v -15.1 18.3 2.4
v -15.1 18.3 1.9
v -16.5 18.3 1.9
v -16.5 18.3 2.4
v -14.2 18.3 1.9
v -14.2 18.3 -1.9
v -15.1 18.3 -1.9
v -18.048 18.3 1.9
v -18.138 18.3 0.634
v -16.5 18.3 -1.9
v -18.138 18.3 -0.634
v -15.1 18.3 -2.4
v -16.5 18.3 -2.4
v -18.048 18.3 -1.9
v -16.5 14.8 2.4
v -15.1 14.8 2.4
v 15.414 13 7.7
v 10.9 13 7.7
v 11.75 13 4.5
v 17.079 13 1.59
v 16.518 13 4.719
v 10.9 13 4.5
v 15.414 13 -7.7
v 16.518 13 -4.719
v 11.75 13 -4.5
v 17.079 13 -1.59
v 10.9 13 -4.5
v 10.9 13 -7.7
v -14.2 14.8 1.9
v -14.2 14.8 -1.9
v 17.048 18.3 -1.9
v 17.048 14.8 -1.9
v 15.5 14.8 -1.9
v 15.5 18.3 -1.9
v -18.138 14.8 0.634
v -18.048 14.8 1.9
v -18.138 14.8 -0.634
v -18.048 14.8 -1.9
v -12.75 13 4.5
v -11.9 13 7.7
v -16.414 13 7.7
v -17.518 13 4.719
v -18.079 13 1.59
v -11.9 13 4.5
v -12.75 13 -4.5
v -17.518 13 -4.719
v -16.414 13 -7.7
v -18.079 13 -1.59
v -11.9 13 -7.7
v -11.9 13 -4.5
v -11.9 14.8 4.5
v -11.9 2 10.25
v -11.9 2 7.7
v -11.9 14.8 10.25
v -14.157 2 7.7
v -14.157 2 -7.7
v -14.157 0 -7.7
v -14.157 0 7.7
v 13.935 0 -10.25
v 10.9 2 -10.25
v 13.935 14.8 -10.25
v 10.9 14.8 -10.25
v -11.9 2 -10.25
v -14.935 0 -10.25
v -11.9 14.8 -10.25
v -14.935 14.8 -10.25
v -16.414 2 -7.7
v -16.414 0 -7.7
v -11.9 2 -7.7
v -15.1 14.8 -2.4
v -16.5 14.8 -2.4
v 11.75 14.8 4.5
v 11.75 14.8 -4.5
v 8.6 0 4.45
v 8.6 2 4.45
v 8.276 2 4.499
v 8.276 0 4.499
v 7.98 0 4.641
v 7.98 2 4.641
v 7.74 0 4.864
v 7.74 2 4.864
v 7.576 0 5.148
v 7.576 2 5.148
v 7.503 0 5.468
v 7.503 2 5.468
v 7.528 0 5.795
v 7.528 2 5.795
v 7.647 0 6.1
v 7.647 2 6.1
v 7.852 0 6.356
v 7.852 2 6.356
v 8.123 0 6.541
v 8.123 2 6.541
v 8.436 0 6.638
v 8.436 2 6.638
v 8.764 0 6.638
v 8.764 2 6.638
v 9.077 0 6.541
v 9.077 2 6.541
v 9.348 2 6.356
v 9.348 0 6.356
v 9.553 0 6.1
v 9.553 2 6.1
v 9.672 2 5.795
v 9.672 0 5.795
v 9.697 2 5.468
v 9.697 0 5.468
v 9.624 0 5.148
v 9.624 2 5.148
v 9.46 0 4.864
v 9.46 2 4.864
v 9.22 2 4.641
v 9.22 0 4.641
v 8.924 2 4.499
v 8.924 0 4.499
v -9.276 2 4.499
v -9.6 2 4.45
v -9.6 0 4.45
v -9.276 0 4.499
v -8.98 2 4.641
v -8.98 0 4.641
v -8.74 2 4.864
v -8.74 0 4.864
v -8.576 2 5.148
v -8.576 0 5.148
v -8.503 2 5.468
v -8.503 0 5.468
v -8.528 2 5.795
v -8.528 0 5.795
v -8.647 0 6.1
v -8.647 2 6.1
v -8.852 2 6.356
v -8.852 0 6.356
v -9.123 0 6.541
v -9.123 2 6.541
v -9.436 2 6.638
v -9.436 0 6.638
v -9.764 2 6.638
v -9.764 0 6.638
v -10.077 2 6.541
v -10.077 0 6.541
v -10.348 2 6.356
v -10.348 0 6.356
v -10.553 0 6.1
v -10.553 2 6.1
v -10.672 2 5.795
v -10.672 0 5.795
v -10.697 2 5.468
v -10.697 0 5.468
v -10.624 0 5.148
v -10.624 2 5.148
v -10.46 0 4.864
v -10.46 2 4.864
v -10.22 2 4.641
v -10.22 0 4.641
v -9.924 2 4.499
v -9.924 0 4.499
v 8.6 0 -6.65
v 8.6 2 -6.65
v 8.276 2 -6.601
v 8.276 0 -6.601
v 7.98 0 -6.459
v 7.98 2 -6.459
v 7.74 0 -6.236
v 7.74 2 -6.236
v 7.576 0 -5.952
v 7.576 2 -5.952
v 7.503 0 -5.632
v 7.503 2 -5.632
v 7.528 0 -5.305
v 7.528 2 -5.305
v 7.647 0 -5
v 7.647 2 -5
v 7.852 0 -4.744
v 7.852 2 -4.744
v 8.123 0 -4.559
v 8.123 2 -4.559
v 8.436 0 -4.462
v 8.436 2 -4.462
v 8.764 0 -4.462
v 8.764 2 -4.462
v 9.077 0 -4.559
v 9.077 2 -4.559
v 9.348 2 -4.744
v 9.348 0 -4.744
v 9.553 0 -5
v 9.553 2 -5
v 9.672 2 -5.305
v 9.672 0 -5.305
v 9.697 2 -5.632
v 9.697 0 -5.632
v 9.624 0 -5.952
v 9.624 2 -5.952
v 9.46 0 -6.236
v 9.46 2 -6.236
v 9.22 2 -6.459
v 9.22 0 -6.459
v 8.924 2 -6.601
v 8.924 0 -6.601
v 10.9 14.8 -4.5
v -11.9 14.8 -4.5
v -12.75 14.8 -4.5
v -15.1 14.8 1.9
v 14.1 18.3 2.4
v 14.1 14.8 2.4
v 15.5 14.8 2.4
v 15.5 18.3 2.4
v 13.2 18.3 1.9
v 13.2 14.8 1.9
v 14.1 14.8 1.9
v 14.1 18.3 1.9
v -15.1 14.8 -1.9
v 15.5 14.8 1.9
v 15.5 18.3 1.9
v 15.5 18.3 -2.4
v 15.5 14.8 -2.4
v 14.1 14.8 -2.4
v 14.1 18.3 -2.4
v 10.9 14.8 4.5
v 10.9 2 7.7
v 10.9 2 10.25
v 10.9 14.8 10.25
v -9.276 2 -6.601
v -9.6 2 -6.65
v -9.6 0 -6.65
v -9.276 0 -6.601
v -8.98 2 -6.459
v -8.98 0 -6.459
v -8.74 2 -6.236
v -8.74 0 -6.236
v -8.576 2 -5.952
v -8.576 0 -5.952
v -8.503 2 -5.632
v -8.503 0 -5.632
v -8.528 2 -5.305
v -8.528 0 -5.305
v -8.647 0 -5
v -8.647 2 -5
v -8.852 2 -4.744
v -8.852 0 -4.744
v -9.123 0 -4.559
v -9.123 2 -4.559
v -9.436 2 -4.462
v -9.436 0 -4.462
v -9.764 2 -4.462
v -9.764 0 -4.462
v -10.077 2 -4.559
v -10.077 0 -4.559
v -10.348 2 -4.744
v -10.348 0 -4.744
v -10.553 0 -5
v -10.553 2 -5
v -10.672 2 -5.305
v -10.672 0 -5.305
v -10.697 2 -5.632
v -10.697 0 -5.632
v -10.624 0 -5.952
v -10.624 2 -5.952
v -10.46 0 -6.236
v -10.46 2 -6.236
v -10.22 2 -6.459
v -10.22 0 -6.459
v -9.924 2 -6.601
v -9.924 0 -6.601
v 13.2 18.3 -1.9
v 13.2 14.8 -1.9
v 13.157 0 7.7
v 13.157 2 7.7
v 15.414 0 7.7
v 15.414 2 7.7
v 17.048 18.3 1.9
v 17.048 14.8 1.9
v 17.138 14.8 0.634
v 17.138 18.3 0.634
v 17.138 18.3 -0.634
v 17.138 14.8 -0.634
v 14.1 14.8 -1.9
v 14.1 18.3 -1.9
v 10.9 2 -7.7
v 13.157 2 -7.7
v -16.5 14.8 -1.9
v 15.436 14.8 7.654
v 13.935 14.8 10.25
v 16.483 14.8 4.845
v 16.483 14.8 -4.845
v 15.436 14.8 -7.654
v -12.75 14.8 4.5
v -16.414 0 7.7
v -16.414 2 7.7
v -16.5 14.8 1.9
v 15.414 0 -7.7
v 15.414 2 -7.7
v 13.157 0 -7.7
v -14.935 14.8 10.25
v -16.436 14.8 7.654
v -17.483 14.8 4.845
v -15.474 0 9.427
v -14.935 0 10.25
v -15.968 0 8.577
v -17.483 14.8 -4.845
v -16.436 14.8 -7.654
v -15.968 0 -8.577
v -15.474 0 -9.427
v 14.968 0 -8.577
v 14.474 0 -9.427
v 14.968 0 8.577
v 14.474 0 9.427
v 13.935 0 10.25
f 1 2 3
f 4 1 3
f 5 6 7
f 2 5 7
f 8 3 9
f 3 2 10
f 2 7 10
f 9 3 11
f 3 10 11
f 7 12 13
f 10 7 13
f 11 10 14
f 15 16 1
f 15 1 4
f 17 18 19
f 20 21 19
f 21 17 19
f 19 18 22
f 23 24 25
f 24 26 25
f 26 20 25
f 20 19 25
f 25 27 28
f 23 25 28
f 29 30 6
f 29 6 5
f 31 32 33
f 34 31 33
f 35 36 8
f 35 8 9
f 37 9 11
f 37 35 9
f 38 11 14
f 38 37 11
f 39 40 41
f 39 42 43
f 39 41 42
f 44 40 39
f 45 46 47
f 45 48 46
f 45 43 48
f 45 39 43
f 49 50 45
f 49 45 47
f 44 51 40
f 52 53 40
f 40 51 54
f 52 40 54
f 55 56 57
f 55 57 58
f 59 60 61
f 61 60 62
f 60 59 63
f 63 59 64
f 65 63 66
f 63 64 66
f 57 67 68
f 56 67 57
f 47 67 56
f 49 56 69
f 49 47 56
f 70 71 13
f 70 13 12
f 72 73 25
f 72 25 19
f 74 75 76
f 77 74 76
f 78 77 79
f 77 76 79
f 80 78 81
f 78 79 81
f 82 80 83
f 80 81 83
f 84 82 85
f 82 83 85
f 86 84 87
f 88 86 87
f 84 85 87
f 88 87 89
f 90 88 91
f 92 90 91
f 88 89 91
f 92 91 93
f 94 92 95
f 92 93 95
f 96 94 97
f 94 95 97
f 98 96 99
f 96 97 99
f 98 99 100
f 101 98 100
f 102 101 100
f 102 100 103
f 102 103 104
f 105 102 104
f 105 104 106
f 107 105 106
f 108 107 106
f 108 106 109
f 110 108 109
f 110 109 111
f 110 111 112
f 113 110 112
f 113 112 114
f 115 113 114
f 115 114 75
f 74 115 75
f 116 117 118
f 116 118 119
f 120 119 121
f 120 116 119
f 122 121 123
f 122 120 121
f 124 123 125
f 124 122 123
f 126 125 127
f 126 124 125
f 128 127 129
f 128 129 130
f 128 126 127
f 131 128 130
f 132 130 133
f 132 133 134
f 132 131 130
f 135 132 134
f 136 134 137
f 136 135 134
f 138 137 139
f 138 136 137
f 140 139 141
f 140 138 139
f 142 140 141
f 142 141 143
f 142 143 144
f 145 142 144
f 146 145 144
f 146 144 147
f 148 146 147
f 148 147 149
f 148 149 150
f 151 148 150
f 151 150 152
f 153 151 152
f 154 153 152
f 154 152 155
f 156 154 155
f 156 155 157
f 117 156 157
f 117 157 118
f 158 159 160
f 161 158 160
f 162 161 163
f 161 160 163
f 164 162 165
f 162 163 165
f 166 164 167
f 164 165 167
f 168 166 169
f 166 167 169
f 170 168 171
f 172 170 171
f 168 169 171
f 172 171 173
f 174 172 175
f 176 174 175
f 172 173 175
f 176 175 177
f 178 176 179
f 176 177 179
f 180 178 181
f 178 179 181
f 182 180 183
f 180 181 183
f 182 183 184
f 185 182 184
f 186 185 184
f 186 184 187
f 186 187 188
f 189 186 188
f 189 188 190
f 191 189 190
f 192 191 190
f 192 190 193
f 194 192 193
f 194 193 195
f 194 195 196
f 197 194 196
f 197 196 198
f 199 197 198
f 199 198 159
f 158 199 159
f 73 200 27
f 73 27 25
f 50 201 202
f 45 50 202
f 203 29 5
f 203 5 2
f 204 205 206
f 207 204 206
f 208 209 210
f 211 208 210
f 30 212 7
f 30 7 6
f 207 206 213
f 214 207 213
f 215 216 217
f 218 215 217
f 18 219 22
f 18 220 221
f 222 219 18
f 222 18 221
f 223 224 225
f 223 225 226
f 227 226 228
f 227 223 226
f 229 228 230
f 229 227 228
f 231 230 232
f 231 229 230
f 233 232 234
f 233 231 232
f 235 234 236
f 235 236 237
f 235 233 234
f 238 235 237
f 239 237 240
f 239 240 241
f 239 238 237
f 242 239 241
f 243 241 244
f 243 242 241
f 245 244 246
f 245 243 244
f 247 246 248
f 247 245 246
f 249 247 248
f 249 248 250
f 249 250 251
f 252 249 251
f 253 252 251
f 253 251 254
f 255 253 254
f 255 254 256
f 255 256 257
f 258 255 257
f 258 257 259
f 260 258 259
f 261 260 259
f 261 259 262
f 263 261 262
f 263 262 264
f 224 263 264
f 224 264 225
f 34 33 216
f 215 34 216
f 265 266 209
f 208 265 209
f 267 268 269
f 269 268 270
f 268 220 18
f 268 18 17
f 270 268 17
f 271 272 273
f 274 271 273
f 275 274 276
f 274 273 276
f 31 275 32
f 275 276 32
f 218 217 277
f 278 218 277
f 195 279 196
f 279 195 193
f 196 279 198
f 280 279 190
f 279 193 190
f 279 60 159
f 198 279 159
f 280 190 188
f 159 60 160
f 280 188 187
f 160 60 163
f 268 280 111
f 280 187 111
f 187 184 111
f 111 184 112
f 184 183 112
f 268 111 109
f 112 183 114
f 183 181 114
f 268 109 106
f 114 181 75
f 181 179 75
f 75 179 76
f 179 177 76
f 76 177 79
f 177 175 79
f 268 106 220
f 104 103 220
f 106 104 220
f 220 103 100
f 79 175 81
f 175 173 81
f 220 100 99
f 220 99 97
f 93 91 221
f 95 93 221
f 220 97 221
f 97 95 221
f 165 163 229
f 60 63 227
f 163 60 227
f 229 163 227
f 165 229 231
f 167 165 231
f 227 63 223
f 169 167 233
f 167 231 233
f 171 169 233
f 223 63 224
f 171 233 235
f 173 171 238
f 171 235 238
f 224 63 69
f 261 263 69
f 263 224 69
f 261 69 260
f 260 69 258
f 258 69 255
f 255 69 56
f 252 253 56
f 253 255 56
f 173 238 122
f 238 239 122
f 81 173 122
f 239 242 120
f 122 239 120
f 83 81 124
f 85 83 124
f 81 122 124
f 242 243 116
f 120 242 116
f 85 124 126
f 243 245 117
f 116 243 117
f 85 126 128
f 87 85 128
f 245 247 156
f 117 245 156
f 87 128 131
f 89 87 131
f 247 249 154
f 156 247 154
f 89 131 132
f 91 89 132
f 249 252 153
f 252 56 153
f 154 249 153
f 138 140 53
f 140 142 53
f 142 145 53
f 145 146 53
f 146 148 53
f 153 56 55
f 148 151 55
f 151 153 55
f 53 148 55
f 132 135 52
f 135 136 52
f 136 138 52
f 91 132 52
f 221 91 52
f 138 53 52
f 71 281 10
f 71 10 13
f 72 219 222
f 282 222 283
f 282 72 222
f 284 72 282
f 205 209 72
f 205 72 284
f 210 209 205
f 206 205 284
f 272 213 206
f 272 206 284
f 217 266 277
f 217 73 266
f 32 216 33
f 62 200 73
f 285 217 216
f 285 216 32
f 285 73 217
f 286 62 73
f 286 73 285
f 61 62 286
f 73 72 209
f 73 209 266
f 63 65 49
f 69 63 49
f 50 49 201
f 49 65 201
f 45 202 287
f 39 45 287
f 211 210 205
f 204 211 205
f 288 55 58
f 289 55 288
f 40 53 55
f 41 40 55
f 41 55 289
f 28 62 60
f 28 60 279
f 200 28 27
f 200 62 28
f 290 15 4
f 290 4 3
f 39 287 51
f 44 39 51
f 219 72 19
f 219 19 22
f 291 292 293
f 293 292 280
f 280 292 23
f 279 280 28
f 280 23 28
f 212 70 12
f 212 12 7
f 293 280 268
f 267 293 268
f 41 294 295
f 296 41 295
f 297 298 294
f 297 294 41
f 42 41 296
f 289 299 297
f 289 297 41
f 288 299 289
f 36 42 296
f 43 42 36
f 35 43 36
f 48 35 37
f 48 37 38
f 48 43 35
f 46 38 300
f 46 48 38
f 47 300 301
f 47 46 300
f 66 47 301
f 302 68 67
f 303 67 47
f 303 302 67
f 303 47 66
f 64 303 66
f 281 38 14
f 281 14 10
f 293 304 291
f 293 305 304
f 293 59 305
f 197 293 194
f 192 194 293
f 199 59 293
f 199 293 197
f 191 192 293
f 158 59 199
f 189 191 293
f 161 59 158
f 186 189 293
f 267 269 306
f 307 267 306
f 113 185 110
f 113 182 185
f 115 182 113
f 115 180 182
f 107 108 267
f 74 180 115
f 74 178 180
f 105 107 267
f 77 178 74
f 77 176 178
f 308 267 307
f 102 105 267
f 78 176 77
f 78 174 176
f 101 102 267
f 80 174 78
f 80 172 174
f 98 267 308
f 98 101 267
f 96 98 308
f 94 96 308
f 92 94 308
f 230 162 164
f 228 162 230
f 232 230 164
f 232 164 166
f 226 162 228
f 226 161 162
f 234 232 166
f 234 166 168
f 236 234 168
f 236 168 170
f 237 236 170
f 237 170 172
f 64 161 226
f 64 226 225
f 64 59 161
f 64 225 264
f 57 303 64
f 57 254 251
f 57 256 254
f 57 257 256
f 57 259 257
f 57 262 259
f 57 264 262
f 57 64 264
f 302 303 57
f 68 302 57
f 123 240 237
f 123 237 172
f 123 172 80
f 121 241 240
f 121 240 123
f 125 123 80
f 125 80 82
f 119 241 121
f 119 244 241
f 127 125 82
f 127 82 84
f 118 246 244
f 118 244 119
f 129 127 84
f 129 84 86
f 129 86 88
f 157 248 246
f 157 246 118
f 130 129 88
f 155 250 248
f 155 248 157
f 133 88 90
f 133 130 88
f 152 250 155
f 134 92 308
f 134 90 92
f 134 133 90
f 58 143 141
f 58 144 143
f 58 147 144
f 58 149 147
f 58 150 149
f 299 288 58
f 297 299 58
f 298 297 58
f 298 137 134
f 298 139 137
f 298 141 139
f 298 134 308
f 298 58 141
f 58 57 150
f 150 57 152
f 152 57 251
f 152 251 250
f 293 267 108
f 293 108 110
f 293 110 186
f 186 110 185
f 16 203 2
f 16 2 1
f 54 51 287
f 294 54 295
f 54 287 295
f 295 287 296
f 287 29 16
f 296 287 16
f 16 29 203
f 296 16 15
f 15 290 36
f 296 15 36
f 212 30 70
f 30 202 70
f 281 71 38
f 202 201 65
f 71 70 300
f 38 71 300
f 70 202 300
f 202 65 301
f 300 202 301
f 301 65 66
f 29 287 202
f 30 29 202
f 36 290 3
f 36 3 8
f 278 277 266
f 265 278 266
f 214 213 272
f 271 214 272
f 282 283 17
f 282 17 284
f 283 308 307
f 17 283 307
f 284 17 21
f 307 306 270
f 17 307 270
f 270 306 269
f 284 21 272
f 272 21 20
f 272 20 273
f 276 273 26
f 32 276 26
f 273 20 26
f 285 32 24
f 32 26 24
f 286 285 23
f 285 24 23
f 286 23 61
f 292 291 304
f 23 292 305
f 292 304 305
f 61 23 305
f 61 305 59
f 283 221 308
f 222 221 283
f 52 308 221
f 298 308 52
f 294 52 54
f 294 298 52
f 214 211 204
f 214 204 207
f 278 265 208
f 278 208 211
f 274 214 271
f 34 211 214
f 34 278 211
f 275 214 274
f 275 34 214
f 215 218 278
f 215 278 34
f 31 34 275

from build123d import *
from build123d.topology import SkipClean

# Parameters (mm, degrees)
SALIENTE_EXTRUIR1_DEPTH           = 14.8
CORTAR_EXTRUIR1_DEPTH             = 25.86366797
CORTAR_EXTRUIR1_DEPTH_BACK        = 25.86366797
CROQUIS2_W                        = 15.4
CROQUIS2_H                        = 11
CORTAR_EXTRUIR2_REACH             = 26.864
CORTAR_EXTRUIR2_DIRECTION_2_DEPTH = 25.86366797
SALIENTE_EXTRUIR2_DEPTH           = 3.5
CROQUIS5_R                        = 1.1
CORTAR_EXTRUIR3_DEPTH             = 26.784723868
CORTAR_EXTRUIR4_DEPTH             = 26.784723868
CROQUIS7_W                        = 27.231493877
CROQUIS7_H                        = 23.409529823
CORTAR_EXTRUIR5_DEPTH             = 28.093393751
CROQUIS8_W                        = 20.5
CROQUIS8_H                        = 2
SALIENTE_EXTRUIR3_DEPTH           = 0.5


with BuildPart() as part:
    # Croquis1 → Saliente-Extruir1 (new body)
    with BuildSketch(Plane(origin=(0, 0, 0), x_dir=(1, 0, 0), z_dir=(0, 1, 0))):
        with BuildLine():
            Line((-13.935, -10.25), (13.935, -10.25))
            ThreePointArc((13.935, -10.25), (17.149328994, 0), (13.935, 10.25))
            Line((13.935, 10.25), (-13.935, 10.25))
            ThreePointArc((-13.935, 10.25), (-17.149328994, 0), (-13.935, -10.25))
        make_face()
    extrude(amount=SALIENTE_EXTRUIR1_DEPTH)

    # Croquis2 → Cortar-Extruir1 (cut, two sides: drawn at the far end of the back side and taken through both)
    with BuildSketch(Plane(origin=(0, 0, 0), x_dir=(0, 0, -1), z_dir=(1, 0, 0)).offset(-CORTAR_EXTRUIR1_DEPTH_BACK)):
        with Locations((0, 7.5)):
            Rectangle(CROQUIS2_W, CROQUIS2_H)
    extrude(amount=CORTAR_EXTRUIR1_DEPTH + CORTAR_EXTRUIR1_DEPTH_BACK, mode=Mode.SUBTRACT)

    # Cortar-Extruir2: up to this face of the body (flat: up to its plane)
    cortar_extruir2_end = Plane(part.part.faces().sort_by_distance((0, 2, 0))[0])
    # Croquis3 → Cortar-Extruir2 (cut, up to the picked face)
    with BuildSketch(Plane(origin=(0, 14.8, 0), x_dir=(1, 0, 0), z_dir=(0, 1, 0)), mode=Mode.PRIVATE) as cortar_extruir2_sk1:
        Polygon((10.9, -10.25), (-10.9, -10.25), (-10.9, -4.5), (-11.75, -4.5), (-11.75, 4.5), (-10.9, 4.5), (-10.9, 10.25), (10.9, 10.25), (10.9, 4.5), (11.75, 4.5), (11.75, -4.5), (10.9, -4.5), align=None)
    cortar_extruir2_tool1 = split(extrude(cortar_extruir2_sk1.sketch, amount=-CORTAR_EXTRUIR2_REACH, mode=Mode.PRIVATE), bisect_by=cortar_extruir2_end, keep=Keep.BOTH, mode=Mode.PRIVATE)
    add(cortar_extruir2_tool1.solids().sort_by(Axis((0, 14.8, 0), (0, -1, 0)))[0], mode=Mode.SUBTRACT)

    # Croquis3 → Cortar-Extruir2 direction 2 (cut)
    with BuildSketch(Plane(origin=(0, 14.8, 0), x_dir=(1, 0, 0), z_dir=(0, 1, 0))):
        Polygon((10.9, -10.25), (-10.9, -10.25), (-10.9, -4.5), (-11.75, -4.5), (-11.75, 4.5), (-10.9, 4.5), (-10.9, 10.25), (10.9, 10.25), (10.9, 4.5), (11.75, 4.5), (11.75, -4.5), (10.9, -4.5), align=None)
    extrude(amount=CORTAR_EXTRUIR2_DIRECTION_2_DEPTH, mode=Mode.SUBTRACT)

    # Croquis4 → Saliente-Extruir2 (add)
    with SkipClean():  # the faces are left unmerged after this step: merging them gives an invalid solid
        with BuildSketch(Plane(origin=(0, 14.8, 0), x_dir=(1, 0, 0), z_dir=(0, 1, 0))):
            with BuildLine():
                Line((-13.2, 1.9), (-13.2, -1.9))
                Line((-13.2, -1.9), (-14.1, -1.9))
                Line((-14.1, -1.9), (-14.1, -2.4))
                Line((-14.1, -2.4), (-15.5, -2.4))
                Line((-15.5, -2.4), (-15.5, -1.9))
                Line((-15.5, -1.9), (-17.048488638, -1.9))
                ThreePointArc((-17.048488638, -1.9), (-17.149328994, 0), (-17.048488638, 1.9))
                Line((-17.048488638, 1.9), (-15.5, 1.9))
                Line((-15.5, 1.9), (-15.5, 2.4))
                Line((-15.5, 2.4), (-14.1, 2.4))
                Line((-14.1, 2.4), (-14.1, 1.9))
                Line((-14.1, 1.9), (-13.2, 1.9))
            make_face()
        saliente_extruir2 = extrude(amount=SALIENTE_EXTRUIR2_DEPTH)

    # Simetría1: Saliente-Extruir2 across plane
    with SkipClean():  # the faces are left unmerged after this step: merging them gives an invalid solid
        add(saliente_extruir2.mirror(Plane(origin=(0, 0, 0), x_dir=(0, 0, 1), z_dir=(1, 0, 0))))

    # Croquis5 → Cortar-Extruir3 (cut, through all)
    with SkipClean():  # the faces are left unmerged after this step: merging them gives an invalid solid
        with BuildSketch(Plane(origin=(0, 2, 0), x_dir=(1, 0, 0), z_dir=(0, 1, 0))):
            with Locations(Location((-8.6, -5.55, 0), (0, 0, 270))):
                Circle(CROQUIS5_R)
            with Locations(Location((-8.6, 5.55, 0), (0, 0, 270))):
                Circle(CROQUIS5_R)
            with Locations(Location((8.6, -5.55, 0), (0, 0, 90))):
                Circle(CROQUIS5_R)
            with Locations(Location((8.6, 5.55, 0), (0, 0, 90))):
                Circle(CROQUIS5_R)
        extrude(amount=-CORTAR_EXTRUIR3_DEPTH, mode=Mode.SUBTRACT)

    # Croquis6 → Cortar-Extruir4 (cut, through all)
    with BuildSketch(Plane(origin=(0, 2, 0), x_dir=(1, 0, 0), z_dir=(0, 1, 0))):
        with BuildLine():
            Line((-13.156952885, 7.7), (-13.156952885, -7.7))
            Line((-13.156952885, -7.7), (-15.413905769, -7.7))
            ThreePointArc((-15.413905769, -7.7), (-17.149328994, 0), (-15.413905769, 7.7))
            Line((-15.413905769, 7.7), (-13.156952885, 7.7))
        make_face()
        with BuildLine():
            Line((13.156952885, 7.7), (13.156952885, -7.7))
            Line((13.156952885, -7.7), (15.413905769, -7.7))
            ThreePointArc((15.413905769, -7.7), (17.149328994, 0), (15.413905769, 7.7))
            Line((15.413905769, 7.7), (13.156952885, 7.7))
        make_face()
    extrude(amount=-CORTAR_EXTRUIR4_DEPTH, mode=Mode.SUBTRACT)

    # Croquis7 → Cortar-Extruir5 (cut, through all)
    with BuildSketch(Plane(origin=(0, 0, 0), x_dir=(0, 0, -1), z_dir=(1, 0, 0))):
        with Locations((0.238872753, 8.562005531)):
            Rectangle(CROQUIS7_W, CROQUIS7_H)
    extrude(amount=-CORTAR_EXTRUIR5_DEPTH, mode=Mode.SUBTRACT)

    # Croquis8 → Saliente-Extruir3 (add)
    with BuildSketch(Plane.ZY):
        with Locations((0, 1)):
            Rectangle(CROQUIS8_W, CROQUIS8_H)
    extrude(amount=SALIENTE_EXTRUIR3_DEPTH)

    # Simetría4: part across plane


with BuildPart() as part_1:
    add(part.part)
    add(part.part.mirror(Plane.ZY.offset(0.5)))


solid = part_1.part
